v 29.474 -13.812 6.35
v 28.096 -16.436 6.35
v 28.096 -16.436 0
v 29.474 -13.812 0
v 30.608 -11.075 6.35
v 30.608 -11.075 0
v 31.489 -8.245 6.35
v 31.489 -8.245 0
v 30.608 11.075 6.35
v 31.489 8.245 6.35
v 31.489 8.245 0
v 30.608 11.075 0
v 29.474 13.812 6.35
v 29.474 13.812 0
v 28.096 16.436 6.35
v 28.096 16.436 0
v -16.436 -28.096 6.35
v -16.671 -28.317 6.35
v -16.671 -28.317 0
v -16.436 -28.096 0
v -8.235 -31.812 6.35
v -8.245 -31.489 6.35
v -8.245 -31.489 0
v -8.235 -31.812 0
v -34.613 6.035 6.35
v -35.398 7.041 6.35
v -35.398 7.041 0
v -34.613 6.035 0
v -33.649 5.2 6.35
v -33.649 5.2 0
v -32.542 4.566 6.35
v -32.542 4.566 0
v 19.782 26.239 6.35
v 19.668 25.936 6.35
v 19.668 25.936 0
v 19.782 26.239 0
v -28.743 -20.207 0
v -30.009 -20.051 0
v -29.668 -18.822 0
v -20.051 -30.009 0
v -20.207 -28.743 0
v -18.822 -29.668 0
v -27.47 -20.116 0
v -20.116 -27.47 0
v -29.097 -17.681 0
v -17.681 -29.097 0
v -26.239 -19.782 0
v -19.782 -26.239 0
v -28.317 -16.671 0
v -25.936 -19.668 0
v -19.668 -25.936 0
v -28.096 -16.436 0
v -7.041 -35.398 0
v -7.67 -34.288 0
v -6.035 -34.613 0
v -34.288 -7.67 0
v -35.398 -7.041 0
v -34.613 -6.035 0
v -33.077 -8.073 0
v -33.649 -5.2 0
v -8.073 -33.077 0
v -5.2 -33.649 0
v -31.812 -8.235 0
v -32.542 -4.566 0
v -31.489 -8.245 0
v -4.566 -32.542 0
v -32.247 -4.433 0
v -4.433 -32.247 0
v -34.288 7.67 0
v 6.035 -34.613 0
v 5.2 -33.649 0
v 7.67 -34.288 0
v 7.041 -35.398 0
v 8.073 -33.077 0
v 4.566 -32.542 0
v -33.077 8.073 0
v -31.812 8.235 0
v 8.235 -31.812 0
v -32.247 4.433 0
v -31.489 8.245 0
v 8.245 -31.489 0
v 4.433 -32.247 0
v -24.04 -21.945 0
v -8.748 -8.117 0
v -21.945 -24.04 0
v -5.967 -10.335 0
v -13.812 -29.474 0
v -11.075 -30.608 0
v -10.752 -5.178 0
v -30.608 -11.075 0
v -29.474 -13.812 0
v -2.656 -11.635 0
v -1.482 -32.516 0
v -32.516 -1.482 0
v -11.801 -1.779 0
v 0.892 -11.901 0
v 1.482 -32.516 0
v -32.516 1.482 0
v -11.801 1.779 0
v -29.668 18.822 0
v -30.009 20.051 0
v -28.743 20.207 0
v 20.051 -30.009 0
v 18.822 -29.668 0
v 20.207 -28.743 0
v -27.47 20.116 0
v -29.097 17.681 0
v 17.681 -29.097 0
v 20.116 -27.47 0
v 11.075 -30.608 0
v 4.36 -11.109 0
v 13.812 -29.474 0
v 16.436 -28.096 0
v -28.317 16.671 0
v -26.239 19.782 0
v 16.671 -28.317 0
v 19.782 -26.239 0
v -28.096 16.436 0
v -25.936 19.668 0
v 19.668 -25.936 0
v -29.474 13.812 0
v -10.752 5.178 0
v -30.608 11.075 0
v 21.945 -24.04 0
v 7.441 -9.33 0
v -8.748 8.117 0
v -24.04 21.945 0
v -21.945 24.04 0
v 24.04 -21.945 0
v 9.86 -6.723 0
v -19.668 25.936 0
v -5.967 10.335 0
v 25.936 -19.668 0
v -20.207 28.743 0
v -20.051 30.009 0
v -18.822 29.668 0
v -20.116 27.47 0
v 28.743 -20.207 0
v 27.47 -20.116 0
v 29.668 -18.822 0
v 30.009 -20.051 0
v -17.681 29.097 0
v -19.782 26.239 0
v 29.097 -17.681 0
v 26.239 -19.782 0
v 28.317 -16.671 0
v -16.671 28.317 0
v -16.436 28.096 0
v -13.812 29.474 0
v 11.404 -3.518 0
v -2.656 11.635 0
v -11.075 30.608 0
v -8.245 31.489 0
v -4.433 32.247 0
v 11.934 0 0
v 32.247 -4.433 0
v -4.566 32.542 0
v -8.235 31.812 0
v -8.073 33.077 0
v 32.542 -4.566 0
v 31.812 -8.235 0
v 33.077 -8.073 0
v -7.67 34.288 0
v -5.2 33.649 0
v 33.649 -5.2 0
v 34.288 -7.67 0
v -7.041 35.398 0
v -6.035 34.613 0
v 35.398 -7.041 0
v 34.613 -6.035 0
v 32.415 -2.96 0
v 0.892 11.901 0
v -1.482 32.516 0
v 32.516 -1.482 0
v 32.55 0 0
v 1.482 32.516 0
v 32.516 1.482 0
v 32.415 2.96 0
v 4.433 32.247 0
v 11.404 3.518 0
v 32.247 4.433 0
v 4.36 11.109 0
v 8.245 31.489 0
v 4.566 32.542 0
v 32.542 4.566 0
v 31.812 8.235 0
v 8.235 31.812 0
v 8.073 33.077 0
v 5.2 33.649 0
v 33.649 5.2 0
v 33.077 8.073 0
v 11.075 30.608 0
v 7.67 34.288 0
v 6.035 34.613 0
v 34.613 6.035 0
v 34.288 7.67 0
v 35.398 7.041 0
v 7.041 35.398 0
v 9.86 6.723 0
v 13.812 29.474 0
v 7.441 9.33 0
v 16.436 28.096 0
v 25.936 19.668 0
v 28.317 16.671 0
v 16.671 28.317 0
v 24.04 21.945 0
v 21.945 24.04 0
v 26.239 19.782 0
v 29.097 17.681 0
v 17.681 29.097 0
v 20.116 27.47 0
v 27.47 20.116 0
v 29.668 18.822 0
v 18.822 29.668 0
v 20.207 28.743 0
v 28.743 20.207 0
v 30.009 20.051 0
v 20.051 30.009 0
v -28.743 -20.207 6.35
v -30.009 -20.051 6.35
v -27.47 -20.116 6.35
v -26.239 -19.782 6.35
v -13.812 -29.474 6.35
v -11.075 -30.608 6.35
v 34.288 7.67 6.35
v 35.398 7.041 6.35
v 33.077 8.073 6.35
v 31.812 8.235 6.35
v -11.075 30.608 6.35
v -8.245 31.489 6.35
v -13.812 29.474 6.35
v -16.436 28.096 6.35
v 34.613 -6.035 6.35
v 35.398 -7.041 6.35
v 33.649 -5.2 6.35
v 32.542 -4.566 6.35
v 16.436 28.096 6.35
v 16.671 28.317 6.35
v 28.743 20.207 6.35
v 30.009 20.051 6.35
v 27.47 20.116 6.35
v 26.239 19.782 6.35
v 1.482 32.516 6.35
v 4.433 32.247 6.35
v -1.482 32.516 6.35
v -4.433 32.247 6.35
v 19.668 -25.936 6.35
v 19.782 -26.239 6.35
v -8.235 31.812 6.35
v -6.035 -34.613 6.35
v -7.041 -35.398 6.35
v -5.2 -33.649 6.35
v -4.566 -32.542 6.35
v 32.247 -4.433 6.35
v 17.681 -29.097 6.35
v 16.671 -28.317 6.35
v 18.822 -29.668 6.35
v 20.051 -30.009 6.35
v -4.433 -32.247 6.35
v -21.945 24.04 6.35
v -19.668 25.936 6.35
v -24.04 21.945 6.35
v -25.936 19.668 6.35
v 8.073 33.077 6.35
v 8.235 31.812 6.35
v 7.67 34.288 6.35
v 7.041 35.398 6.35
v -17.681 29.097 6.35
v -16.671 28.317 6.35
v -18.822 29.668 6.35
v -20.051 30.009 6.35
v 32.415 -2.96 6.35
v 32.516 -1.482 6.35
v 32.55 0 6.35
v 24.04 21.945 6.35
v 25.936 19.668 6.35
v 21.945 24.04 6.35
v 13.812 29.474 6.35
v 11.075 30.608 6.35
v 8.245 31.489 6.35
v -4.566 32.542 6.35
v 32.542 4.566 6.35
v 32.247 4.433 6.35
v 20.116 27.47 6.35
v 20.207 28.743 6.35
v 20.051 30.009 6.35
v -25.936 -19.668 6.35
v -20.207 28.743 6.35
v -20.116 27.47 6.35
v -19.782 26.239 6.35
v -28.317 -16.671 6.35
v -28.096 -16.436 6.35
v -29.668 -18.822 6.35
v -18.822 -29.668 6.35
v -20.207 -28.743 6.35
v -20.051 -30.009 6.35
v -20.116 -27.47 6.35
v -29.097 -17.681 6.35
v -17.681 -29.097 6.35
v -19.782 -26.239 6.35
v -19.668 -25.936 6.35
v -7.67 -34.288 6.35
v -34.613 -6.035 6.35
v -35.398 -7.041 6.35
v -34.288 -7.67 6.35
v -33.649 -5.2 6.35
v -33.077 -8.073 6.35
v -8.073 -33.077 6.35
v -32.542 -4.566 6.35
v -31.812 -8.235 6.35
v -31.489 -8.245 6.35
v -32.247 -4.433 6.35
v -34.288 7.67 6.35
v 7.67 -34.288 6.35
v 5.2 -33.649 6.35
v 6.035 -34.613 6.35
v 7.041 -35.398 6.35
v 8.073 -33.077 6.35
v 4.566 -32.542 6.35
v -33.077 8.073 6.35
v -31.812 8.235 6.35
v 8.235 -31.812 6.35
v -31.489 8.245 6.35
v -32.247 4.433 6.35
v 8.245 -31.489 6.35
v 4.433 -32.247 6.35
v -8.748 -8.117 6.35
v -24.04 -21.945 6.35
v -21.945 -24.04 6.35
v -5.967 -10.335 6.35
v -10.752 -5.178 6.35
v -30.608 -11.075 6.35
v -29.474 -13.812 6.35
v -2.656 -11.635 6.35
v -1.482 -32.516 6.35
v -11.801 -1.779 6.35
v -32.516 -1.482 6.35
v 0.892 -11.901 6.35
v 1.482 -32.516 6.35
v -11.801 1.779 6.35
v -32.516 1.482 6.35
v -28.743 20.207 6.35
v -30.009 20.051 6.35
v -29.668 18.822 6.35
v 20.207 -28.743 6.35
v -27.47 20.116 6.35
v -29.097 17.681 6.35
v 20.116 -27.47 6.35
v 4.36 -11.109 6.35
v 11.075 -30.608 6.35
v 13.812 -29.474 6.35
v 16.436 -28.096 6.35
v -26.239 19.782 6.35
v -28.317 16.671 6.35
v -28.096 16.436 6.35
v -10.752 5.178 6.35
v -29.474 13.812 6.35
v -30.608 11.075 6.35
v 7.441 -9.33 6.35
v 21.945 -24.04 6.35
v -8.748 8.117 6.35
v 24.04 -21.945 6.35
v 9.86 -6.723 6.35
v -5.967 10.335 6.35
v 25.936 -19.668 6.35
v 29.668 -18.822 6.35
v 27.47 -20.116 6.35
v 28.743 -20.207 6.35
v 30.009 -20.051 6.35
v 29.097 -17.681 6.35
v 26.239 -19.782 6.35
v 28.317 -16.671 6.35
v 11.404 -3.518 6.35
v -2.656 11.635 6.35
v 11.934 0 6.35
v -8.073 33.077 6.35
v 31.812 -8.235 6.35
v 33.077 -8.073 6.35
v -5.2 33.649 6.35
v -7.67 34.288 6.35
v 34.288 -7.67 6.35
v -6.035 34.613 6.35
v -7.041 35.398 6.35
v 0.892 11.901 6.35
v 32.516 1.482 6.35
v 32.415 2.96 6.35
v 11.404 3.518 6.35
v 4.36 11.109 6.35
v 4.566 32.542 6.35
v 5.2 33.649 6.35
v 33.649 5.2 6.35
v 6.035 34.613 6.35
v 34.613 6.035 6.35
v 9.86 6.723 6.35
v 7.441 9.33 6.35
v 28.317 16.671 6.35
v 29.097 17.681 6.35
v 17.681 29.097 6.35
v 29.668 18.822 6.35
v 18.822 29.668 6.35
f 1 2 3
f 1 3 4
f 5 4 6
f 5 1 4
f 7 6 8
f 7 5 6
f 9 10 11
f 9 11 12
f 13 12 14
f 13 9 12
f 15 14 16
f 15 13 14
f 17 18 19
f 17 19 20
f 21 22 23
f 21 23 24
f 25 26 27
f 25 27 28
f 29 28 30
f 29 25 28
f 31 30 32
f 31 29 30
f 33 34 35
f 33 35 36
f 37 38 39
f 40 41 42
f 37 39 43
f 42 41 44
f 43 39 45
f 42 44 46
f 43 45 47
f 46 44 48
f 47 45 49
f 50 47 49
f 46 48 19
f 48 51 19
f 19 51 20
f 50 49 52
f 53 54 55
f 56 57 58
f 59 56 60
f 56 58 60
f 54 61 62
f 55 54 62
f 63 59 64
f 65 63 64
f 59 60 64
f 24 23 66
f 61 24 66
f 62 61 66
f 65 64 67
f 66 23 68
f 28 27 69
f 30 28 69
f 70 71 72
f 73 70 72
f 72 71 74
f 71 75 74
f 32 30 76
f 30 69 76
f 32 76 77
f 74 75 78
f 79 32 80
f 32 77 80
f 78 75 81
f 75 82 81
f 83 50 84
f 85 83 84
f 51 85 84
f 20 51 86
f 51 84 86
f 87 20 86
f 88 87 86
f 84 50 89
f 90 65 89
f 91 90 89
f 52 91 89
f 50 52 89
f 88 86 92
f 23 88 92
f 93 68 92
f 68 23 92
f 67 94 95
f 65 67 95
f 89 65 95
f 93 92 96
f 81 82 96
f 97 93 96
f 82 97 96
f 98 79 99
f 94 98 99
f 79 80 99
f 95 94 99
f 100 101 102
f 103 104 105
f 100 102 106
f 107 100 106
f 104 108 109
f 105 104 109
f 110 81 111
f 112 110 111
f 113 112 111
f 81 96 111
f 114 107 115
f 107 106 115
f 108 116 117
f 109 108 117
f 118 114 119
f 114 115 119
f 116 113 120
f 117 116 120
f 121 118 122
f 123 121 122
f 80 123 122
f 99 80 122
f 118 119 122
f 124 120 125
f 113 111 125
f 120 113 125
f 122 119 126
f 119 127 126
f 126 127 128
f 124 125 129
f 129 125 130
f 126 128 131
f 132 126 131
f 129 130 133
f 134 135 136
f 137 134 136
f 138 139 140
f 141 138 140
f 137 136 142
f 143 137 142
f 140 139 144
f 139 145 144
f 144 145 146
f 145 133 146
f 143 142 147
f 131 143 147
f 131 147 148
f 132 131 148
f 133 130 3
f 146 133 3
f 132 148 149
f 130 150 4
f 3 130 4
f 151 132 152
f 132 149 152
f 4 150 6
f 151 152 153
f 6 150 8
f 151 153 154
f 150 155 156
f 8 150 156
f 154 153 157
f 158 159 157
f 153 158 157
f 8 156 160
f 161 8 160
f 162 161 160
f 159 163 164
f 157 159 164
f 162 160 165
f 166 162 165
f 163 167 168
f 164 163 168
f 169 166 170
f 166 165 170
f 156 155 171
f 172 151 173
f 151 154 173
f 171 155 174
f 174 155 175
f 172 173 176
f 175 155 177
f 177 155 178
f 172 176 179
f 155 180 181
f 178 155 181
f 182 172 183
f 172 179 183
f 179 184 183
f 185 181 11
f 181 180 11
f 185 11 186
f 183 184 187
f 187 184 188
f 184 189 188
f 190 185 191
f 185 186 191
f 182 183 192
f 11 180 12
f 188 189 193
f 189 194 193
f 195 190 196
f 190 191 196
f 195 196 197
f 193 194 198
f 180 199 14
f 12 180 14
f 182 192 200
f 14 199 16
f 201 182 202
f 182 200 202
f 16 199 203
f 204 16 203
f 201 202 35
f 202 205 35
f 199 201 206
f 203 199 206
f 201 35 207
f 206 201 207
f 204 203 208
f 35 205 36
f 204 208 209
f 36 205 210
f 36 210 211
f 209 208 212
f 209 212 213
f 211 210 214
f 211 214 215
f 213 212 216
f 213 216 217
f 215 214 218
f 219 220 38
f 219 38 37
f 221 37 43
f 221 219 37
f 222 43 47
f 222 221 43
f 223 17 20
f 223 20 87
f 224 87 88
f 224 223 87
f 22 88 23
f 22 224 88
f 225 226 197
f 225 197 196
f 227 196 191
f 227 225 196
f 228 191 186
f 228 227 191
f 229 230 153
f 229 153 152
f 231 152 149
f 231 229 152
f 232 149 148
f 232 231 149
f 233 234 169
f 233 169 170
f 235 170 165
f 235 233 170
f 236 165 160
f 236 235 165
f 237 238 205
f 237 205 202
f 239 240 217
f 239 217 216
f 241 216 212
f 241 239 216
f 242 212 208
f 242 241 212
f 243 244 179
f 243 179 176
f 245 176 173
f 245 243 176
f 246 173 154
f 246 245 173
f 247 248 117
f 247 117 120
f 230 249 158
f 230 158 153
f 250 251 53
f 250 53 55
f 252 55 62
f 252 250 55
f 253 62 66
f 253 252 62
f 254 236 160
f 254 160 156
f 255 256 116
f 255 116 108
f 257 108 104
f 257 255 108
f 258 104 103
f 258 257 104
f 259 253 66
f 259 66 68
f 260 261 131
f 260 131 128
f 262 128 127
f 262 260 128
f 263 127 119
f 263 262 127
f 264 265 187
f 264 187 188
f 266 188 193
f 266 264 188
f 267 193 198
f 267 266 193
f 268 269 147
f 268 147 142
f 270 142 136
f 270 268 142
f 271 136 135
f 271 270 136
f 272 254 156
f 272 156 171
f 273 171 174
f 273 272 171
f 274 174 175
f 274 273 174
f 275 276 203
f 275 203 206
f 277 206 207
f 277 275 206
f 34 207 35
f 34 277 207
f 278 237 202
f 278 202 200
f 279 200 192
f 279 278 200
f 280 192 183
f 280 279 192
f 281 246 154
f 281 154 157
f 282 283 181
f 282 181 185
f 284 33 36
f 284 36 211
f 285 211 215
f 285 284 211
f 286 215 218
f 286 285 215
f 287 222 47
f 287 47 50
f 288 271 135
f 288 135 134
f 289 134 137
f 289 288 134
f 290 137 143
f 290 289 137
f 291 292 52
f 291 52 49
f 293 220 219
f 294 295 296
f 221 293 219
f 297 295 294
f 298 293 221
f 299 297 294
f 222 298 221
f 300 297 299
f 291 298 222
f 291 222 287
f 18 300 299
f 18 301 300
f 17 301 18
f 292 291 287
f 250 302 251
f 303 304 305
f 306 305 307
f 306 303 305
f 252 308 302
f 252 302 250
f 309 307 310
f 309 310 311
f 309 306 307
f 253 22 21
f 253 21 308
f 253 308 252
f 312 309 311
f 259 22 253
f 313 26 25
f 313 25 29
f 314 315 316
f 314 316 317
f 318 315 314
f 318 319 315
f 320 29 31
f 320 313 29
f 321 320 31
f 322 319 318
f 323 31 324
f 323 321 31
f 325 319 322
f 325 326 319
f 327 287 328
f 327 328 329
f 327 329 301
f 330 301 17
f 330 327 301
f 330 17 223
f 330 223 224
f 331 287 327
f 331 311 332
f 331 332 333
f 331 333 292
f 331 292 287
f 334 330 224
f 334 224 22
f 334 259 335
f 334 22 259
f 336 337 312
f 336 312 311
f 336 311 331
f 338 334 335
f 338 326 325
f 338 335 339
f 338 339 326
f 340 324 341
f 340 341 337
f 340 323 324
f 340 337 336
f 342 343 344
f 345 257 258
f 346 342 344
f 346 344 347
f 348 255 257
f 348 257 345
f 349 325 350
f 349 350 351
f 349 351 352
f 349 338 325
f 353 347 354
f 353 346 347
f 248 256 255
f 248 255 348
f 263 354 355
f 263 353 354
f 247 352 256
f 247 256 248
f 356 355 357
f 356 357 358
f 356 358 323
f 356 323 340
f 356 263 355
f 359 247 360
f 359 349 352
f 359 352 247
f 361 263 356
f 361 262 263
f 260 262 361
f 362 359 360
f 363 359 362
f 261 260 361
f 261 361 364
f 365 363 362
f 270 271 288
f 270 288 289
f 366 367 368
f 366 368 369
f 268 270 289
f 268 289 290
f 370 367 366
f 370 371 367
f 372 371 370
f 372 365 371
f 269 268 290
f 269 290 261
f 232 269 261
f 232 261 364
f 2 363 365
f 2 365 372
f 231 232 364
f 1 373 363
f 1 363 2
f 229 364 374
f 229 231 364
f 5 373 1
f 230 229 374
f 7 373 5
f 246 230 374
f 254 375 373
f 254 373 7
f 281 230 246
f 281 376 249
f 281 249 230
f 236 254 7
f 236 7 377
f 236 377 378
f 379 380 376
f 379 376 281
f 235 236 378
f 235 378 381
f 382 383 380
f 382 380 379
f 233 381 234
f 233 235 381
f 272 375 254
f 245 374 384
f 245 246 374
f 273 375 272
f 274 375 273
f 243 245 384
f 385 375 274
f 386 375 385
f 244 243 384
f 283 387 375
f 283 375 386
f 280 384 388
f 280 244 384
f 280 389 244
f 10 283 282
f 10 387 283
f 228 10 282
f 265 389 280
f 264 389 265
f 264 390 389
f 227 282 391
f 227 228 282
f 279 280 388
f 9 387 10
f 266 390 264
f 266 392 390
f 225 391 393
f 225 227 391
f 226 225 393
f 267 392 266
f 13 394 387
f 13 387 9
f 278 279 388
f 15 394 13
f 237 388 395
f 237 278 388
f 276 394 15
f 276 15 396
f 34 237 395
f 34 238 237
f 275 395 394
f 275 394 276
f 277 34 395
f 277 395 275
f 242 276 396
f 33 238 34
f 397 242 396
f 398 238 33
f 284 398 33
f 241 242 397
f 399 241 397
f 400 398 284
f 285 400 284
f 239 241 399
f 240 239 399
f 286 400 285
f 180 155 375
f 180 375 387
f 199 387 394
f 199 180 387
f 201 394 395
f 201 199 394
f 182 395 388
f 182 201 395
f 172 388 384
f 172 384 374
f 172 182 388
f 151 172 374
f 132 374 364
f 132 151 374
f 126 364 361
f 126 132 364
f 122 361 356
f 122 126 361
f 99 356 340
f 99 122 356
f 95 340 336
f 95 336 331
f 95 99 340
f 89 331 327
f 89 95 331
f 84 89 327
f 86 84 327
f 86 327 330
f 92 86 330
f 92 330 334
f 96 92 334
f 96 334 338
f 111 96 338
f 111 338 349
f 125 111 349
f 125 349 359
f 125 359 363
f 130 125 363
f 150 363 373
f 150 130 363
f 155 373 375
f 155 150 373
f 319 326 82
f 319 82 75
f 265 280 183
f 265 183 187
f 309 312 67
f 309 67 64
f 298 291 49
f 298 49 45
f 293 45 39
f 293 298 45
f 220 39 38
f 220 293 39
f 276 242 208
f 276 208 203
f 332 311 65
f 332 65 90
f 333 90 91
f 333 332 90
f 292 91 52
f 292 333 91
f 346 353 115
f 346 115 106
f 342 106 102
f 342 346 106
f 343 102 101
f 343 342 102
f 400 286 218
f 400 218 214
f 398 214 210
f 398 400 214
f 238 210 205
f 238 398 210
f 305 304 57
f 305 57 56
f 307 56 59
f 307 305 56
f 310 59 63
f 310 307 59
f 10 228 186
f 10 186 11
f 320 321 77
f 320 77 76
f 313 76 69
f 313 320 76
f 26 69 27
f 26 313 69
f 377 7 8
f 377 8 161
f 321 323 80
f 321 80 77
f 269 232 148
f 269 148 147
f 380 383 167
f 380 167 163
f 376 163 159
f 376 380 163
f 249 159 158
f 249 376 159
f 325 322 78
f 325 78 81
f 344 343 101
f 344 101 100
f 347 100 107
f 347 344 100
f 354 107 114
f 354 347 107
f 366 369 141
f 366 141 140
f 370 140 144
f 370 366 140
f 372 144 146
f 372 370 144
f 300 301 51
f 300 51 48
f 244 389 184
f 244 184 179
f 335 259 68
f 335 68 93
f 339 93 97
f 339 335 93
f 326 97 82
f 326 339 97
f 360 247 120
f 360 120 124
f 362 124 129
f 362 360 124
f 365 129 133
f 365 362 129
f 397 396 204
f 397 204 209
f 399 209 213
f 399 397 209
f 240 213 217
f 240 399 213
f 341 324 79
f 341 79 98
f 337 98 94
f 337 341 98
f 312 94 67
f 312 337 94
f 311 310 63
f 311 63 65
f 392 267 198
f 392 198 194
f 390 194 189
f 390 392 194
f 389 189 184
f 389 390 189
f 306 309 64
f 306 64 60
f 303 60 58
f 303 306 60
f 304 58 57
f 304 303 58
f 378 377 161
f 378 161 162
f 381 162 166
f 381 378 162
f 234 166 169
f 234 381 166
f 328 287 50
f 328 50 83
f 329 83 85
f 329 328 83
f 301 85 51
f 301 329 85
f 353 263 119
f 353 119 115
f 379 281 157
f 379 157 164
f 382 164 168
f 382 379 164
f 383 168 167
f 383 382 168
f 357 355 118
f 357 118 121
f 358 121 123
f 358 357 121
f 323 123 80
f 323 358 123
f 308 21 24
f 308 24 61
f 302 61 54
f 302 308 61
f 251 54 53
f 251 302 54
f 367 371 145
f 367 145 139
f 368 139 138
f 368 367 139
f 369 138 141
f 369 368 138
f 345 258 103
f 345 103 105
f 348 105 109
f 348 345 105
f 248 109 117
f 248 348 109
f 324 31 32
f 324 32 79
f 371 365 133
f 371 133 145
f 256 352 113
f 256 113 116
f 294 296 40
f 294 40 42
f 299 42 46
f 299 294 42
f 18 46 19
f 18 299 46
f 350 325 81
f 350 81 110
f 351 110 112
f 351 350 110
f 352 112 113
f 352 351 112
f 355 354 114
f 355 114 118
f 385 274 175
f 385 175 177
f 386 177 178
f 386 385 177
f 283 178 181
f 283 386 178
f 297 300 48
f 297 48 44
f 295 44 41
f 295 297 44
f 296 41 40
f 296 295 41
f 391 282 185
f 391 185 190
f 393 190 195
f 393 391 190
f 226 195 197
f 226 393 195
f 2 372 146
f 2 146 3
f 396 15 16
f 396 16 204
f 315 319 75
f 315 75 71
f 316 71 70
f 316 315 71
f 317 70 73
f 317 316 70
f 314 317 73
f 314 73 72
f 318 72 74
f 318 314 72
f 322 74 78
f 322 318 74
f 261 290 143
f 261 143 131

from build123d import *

# Parameters (mm, degrees)
F0_R     = 44.45
F0_R_2   = 25.4
F0_R_3   = 11.9340457022
F1_DEPTH = 6.35
F3_DEPTH = 6.35


with BuildPart() as f1:
    # F0 (on Top) → F1 (new body)
    with BuildSketch(Plane.XY):
        Circle(F0_R)
        Circle(F0_R_2, mode=Mode.SUBTRACT)
        Circle(F0_R_2)
        Circle(F0_R_3, mode=Mode.SUBTRACT)
    extrude(amount=F1_DEPTH)

    # F2 (on face) → F3 (intersect)
    with BuildSketch(Plane.XY.offset(6.35)):
        with BuildLine():
            ThreePointArc((32.2468627383, -4.4327027358), (32.4742021983, -2.2215313627), (32.5501, 0))
            ThreePointArc((32.5501, 0), (32.4742021983, 2.2215313627), (32.2468627383, 4.4327027358))
            ThreePointArc((32.2468627383, 4.4327027358), (31.1168279297, 3.8288728943), (30.0699408338, 3.0902142758))
            ThreePointArc((30.0699408338, 3.0902142758), (28.5877, 0), (30.0699408338, -3.0902142758))
            ThreePointArc((30.0699408338, -3.0902142758), (31.1168279297, -3.8288728943), (32.2468627383, -4.4327027358))
        make_face()
        with BuildLine():
            ThreePointArc((30.0699408338, 3.0902142758), (31.1168279297, 3.8288728943), (32.2468627383, 4.4327027358))
            ThreePointArc((32.2468627383, 4.4327027358), (31.9246589557, 6.3502094907), (31.4885383693, 8.2450567844))
            ThreePointArc((31.4885383693, 8.2450567844), (30.2134466622, 8.3704772169), (28.963576686, 8.6522824488))
            ThreePointArc((28.963576686, 8.6522824488), (26.4115909116, 10.9400391594), (26.5984290744, 14.3622538898))
            ThreePointArc((26.5984290744, 14.3622538898), (27.2829542197, 15.4453118161), (28.0958945741, 16.4356234471))
            ThreePointArc((28.0958945741, 16.4356234471), (27.0644190274, 18.0838666418), (25.9363694778, 19.6675811508))
            ThreePointArc((25.9363694778, 19.6675811508), (24.710342026, 19.2954980503), (23.4477705432, 19.0775476037))
            ThreePointArc((23.4477705432, 19.0775476037), (20.2145565285, 20.2145565285), (19.0775476037, 23.4477705432))
            ThreePointArc((19.0775476037, 23.4477705432), (19.2954980503, 24.710342026), (19.6675811508, 25.9363694778))
            ThreePointArc((19.6675811508, 25.9363694778), (18.0838666418, 27.0644190274), (16.4356234471, 28.0958945741))
            ThreePointArc((16.4356234471, 28.0958945741), (15.4453118161, 27.2829542197), (14.3622538898, 26.5984290744))
            ThreePointArc((14.3622538898, 26.5984290744), (10.9400391594, 26.4115909116), (8.6522824488, 28.963576686))
            ThreePointArc((8.6522824488, 28.963576686), (8.3704772169, 30.2134466622), (8.2450567844, 31.4885383693))
            ThreePointArc((8.2450567844, 31.4885383693), (6.3502094907, 31.9246589557), (4.4327027358, 32.2468627383))
            ThreePointArc((4.4327027358, 32.2468627383), (3.8288728943, 31.1168279297), (3.0902142758, 30.0699408338))
            ThreePointArc((3.0902142758, 30.0699408338), (0, 28.5877), (-3.0902142758, 30.0699408338))
            ThreePointArc((-3.0902142758, 30.0699408338), (-3.8288728943, 31.1168279297), (-4.4327027358, 32.2468627383))
            ThreePointArc((-4.4327027358, 32.2468627383), (-6.3502094907, 31.9246589557), (-8.2450567844, 31.4885383693))
            ThreePointArc((-8.2450567844, 31.4885383693), (-8.3704772169, 30.2134466622), (-8.6522824488, 28.963576686))
            ThreePointArc((-8.6522824488, 28.963576686), (-10.9400391594, 26.4115909116), (-14.3622538898, 26.5984290744))
            ThreePointArc((-14.3622538898, 26.5984290744), (-15.4453118161, 27.2829542197), (-16.4356234471, 28.0958945741))
            ThreePointArc((-16.4356234471, 28.0958945741), (-18.0838666418, 27.0644190274), (-19.6675811508, 25.9363694778))
            ThreePointArc((-19.6675811508, 25.9363694778), (-19.2954980503, 24.710342026), (-19.0775476037, 23.4477705432))
            ThreePointArc((-19.0775476037, 23.4477705432), (-20.2145565285, 20.2145565285), (-23.4477705432, 19.0775476037))
            ThreePointArc((-23.4477705432, 19.0775476037), (-24.710342026, 19.2954980503), (-25.9363694778, 19.6675811508))
            ThreePointArc((-25.9363694778, 19.6675811508), (-27.0644190274, 18.0838666418), (-28.0958945741, 16.4356234471))
            ThreePointArc((-28.0958945741, 16.4356234471), (-27.2829542197, 15.4453118161), (-26.5984290744, 14.3622538898))
            ThreePointArc((-26.5984290744, 14.3622538898), (-26.4115909116, 10.9400391594), (-28.963576686, 8.6522824488))
            ThreePointArc((-28.963576686, 8.6522824488), (-30.2134466622, 8.3704772169), (-31.4885383693, 8.2450567844))
            ThreePointArc((-31.4885383693, 8.2450567844), (-31.9246589557, 6.3502094907), (-32.2468627383, 4.4327027358))
            ThreePointArc((-32.2468627383, 4.4327027358), (-31.1168279297, 3.8288728943), (-30.0699408338, 3.0902142758))
            ThreePointArc((-30.0699408338, 3.0902142758), (-28.5877, 0), (-30.0699408338, -3.0902142758))
            ThreePointArc((-30.0699408338, -3.0902142758), (-31.1168279297, -3.8288728943), (-32.2468627383, -4.4327027358))
            ThreePointArc((-32.2468627383, -4.4327027358), (-31.9246589557, -6.3502094907), (-31.4885383693, -8.2450567844))
            ThreePointArc((-31.4885383693, -8.2450567844), (-30.2134466622, -8.3704772169), (-28.963576686, -8.6522824488))
            ThreePointArc((-28.963576686, -8.6522824488), (-26.4115909116, -10.9400391594), (-26.5984290744, -14.3622538898))
            ThreePointArc((-26.5984290744, -14.3622538898), (-27.2829542197, -15.4453118161), (-28.0958945741, -16.4356234471))
            ThreePointArc((-28.0958945741, -16.4356234471), (-27.0644190274, -18.0838666418), (-25.9363694778, -19.6675811508))
            ThreePointArc((-25.9363694778, -19.6675811508), (-24.710342026, -19.2954980503), (-23.4477705432, -19.0775476037))
            ThreePointArc((-23.4477705432, -19.0775476037), (-20.2145565285, -20.2145565285), (-19.0775476037, -23.4477705432))
            ThreePointArc((-19.0775476037, -23.4477705432), (-19.2954980503, -24.710342026), (-19.6675811508, -25.9363694778))
            ThreePointArc((-19.6675811508, -25.9363694778), (-18.0838666418, -27.0644190274), (-16.4356234471, -28.0958945741))
            ThreePointArc((-16.4356234471, -28.0958945741), (-15.4453118161, -27.2829542197), (-14.3622538898, -26.5984290744))
            ThreePointArc((-14.3622538898, -26.5984290744), (-10.9400391594, -26.4115909116), (-8.6522824488, -28.963576686))
            ThreePointArc((-8.6522824488, -28.963576686), (-8.3704772169, -30.2134466622), (-8.2450567844, -31.4885383693))
            ThreePointArc((-8.2450567844, -31.4885383693), (-6.3502094907, -31.9246589557), (-4.4327027358, -32.2468627383))
            ThreePointArc((-4.4327027358, -32.2468627383), (-3.8288728943, -31.1168279297), (-3.0902142758, -30.0699408338))
            ThreePointArc((-3.0902142758, -30.0699408338), (0, -28.5877), (3.0902142758, -30.0699408338))
            ThreePointArc((3.0902142758, -30.0699408338), (3.8288728943, -31.1168279297), (4.4327027358, -32.2468627383))
            ThreePointArc((4.4327027358, -32.2468627383), (6.3502094907, -31.9246589557), (8.2450567844, -31.4885383693))
            ThreePointArc((8.2450567844, -31.4885383693), (8.3704772169, -30.2134466622), (8.6522824488, -28.963576686))
            ThreePointArc((8.6522824488, -28.963576686), (10.9400391594, -26.4115909116), (14.3622538898, -26.5984290744))
            ThreePointArc((14.3622538898, -26.5984290744), (15.4453118161, -27.2829542197), (16.4356234471, -28.0958945741))
            ThreePointArc((16.4356234471, -28.0958945741), (18.0838666418, -27.0644190274), (19.6675811508, -25.9363694778))
            ThreePointArc((19.6675811508, -25.9363694778), (19.2954980503, -24.710342026), (19.0775476037, -23.4477705432))
            ThreePointArc((19.0775476037, -23.4477705432), (20.2145565285, -20.2145565285), (23.4477705432, -19.0775476037))
            ThreePointArc((23.4477705432, -19.0775476037), (24.710342026, -19.2954980503), (25.9363694778, -19.6675811508))
            ThreePointArc((25.9363694778, -19.6675811508), (27.0644190274, -18.0838666418), (28.0958945741, -16.4356234471))
            ThreePointArc((28.0958945741, -16.4356234471), (27.2829542197, -15.4453118161), (26.5984290744, -14.3622538898))
            ThreePointArc((26.5984290744, -14.3622538898), (26.4115909116, -10.9400391594), (28.963576686, -8.6522824488))
            ThreePointArc((28.963576686, -8.6522824488), (30.2134466622, -8.3704772169), (31.4885383693, -8.2450567844))
            ThreePointArc((31.4885383693, -8.2450567844), (31.9246589557, -6.3502094907), (32.2468627383, -4.4327027358))
            ThreePointArc((32.2468627383, -4.4327027358), (31.1168279297, -3.8288728943), (30.0699408338, -3.0902142758))
            ThreePointArc((30.0699408338, -3.0902142758), (28.5877, 0), (30.0699408338, 3.0902142758))
        make_face()
        with BuildLine():
            ThreePointArc((31.4885383693, 8.2450567844), (31.9246589557, 6.3502094907), (32.2468627383, 4.4327027358))
            Line((32.2468627383, 4.4327027358), (32.5415226488, 4.5656185547))
            ThreePointArc((32.5415226488, 4.5656185547), (34.1510381023, 5.5942061718), (35.3980380551, 7.0411075501))
            ThreePointArc((35.3980380551, 7.0411075501), (33.6922551359, 7.900663897), (31.8116333114, 8.2350200457))
            Line((31.8116333114, 8.2350200457), (31.4885383693, 8.2450567844))
        make_face()
        with BuildLine():
            Line((32.5415226488, -4.5656185547), (32.2468627383, -4.4327027358))
            ThreePointArc((32.2468627383, -4.4327027358), (31.9246589557, -6.3502094907), (31.4885383693, -8.2450567844))
            Line((31.4885383693, -8.2450567844), (31.8116333114, -8.2350200457))
            ThreePointArc((31.8116333114, -8.2350200457), (33.6922551359, -7.900663897), (35.3980380551, -7.0411075501))
            ThreePointArc((35.3980380551, -7.0411075501), (34.1510381023, -5.5942061718), (32.5415226488, -4.5656185547))
        make_face()
        with BuildLine():
            ThreePointArc((28.963576686, 8.6522824488), (30.2134466622, 8.3704772169), (31.4885383693, 8.2450567844))
            ThreePointArc((31.4885383693, 8.2450567844), (30.0723711712, 12.4563839918), (28.0958945741, 16.4356234471))
            ThreePointArc((28.0958945741, 16.4356234471), (27.2829542197, 15.4453118161), (26.5984290744, 14.3622538898))
            ThreePointArc((26.5984290744, 14.3622538898), (26.4115909116, 10.9400391594), (28.963576686, 8.6522824488))
        make_face()
        with BuildLine():
            ThreePointArc((28.0958945741, -16.4356234471), (30.0723711712, -12.4563839918), (31.4885383693, -8.2450567844))
            ThreePointArc((31.4885383693, -8.2450567844), (30.2134466622, -8.3704772169), (28.963576686, -8.6522824488))
            ThreePointArc((28.963576686, -8.6522824488), (26.4115909116, -10.9400391594), (26.5984290744, -14.3622538898))
            ThreePointArc((26.5984290744, -14.3622538898), (27.2829542197, -15.4453118161), (28.0958945741, -16.4356234471))
        make_face()
        with BuildLine():
            ThreePointArc((25.9363694778, 19.6675811508), (27.0644190274, 18.0838666418), (28.0958945741, 16.4356234471))
            Line((28.0958945741, 16.4356234471), (28.3172601526, 16.6711831176))
            ThreePointArc((28.3172601526, 16.6711831176), (29.4106350975, 18.2374090626), (30.0090076452, 20.0513778537))
            ThreePointArc((30.0090076452, 20.0513778537), (28.1041317461, 20.1927295073), (26.2387111755, 19.7819514948))
            Line((26.2387111755, 19.7819514948), (25.9363694778, 19.6675811508))
        make_face()
        with BuildLine():
            Line((28.3172601526, -16.6711831176), (28.0958945741, -16.4356234471))
            ThreePointArc((28.0958945741, -16.4356234471), (27.0644190274, -18.0838666418), (25.9363694778, -19.6675811508))
            Line((25.9363694778, -19.6675811508), (26.2387111755, -19.7819514948))
            ThreePointArc((26.2387111755, -19.7819514948), (28.1041317461, -20.1927295073), (30.0090076452, -20.0513778537))
            ThreePointArc((30.0090076452, -20.0513778537), (29.4106350975, -18.2374090626), (28.3172601526, -16.6711831176))
        make_face()
        with BuildLine():
            ThreePointArc((23.4477705432, 19.0775476037), (24.710342026, 19.2954980503), (25.9363694778, 19.6675811508))
            ThreePointArc((25.9363694778, 19.6675811508), (23.0163964383, 23.0163964383), (19.6675811508, 25.9363694778))
            ThreePointArc((19.6675811508, 25.9363694778), (19.2954980503, 24.710342026), (19.0775476037, 23.4477705432))
            ThreePointArc((19.0775476037, 23.4477705432), (20.2145565285, 20.2145565285), (23.4477705432, 19.0775476037))
        make_face()
        with BuildLine():
            ThreePointArc((19.6675811508, -25.9363694778), (23.0163964383, -23.0163964383), (25.9363694778, -19.6675811508))
            ThreePointArc((25.9363694778, -19.6675811508), (24.710342026, -19.2954980503), (23.4477705432, -19.0775476037))
            ThreePointArc((23.4477705432, -19.0775476037), (20.2145565285, -20.2145565285), (19.0775476037, -23.4477705432))
            ThreePointArc((19.0775476037, -23.4477705432), (19.2954980503, -24.710342026), (19.6675811508, -25.9363694778))
        make_face()
        with BuildLine():
            ThreePointArc((16.4356234471, 28.0958945741), (18.0838666418, 27.0644190274), (19.6675811508, 25.9363694778))
            Line((19.6675811508, 25.9363694778), (19.7819514948, 26.2387111755))
            ThreePointArc((19.7819514948, 26.2387111755), (20.1927295073, 28.1041317461), (20.0513778537, 30.0090076452))
            ThreePointArc((20.0513778537, 30.0090076452), (18.2374090626, 29.4106350975), (16.6711831176, 28.3172601526))
            Line((16.6711831176, 28.3172601526), (16.4356234471, 28.0958945741))
        make_face()
        with BuildLine():
            Line((19.7819514948, -26.2387111755), (19.6675811508, -25.9363694778))
            ThreePointArc((19.6675811508, -25.9363694778), (18.0838666418, -27.0644190274), (16.4356234471, -28.0958945741))
            Line((16.4356234471, -28.0958945741), (16.6711831176, -28.3172601526))
            ThreePointArc((16.6711831176, -28.3172601526), (18.2374090626, -29.4106350975), (20.0513778537, -30.0090076452))
            ThreePointArc((20.0513778537, -30.0090076452), (20.1927295073, -28.1041317461), (19.7819514948, -26.2387111755))
        make_face()
        with BuildLine():
            ThreePointArc((14.3622538898, 26.5984290744), (15.4453118161, 27.2829542197), (16.4356234471, 28.0958945741))
            ThreePointArc((16.4356234471, 28.0958945741), (12.4563839918, 30.0723711712), (8.2450567844, 31.4885383693))
            ThreePointArc((8.2450567844, 31.4885383693), (8.3704772169, 30.2134466622), (8.6522824488, 28.963576686))
            ThreePointArc((8.6522824488, 28.963576686), (10.9400391594, 26.4115909116), (14.3622538898, 26.5984290744))
        make_face()
        with BuildLine():
            ThreePointArc((8.2450567844, -31.4885383693), (12.4563839918, -30.0723711712), (16.4356234471, -28.0958945741))
            ThreePointArc((16.4356234471, -28.0958945741), (15.4453118161, -27.2829542197), (14.3622538898, -26.5984290744))
            ThreePointArc((14.3622538898, -26.5984290744), (10.9400391594, -26.4115909116), (8.6522824488, -28.963576686))
            ThreePointArc((8.6522824488, -28.963576686), (8.3704772169, -30.2134466622), (8.2450567844, -31.4885383693))
        make_face()
        with BuildLine():
            ThreePointArc((4.4327027358, 32.2468627383), (6.3502094907, 31.9246589557), (8.2450567844, 31.4885383693))
            Line((8.2450567844, 31.4885383693), (8.2350200457, 31.8116333114))
            ThreePointArc((8.2350200457, 31.8116333114), (7.900663897, 33.6922551359), (7.0411075501, 35.3980380551))
            ThreePointArc((7.0411075501, 35.3980380551), (5.5942061718, 34.1510381023), (4.5656185547, 32.5415226488))
            Line((4.5656185547, 32.5415226488), (4.4327027358, 32.2468627383))
        make_face()
        with BuildLine():
            Line((8.2350200457, -31.8116333114), (8.2450567844, -31.4885383693))
            ThreePointArc((8.2450567844, -31.4885383693), (6.3502094907, -31.9246589557), (4.4327027358, -32.2468627383))
            Line((4.4327027358, -32.2468627383), (4.5656185547, -32.5415226488))
            ThreePointArc((4.5656185547, -32.5415226488), (5.5942061718, -34.1510381023), (7.0411075501, -35.3980380551))
            ThreePointArc((7.0411075501, -35.3980380551), (7.900663897, -33.6922551359), (8.2350200457, -31.8116333114))
        make_face()
        with BuildLine():
            ThreePointArc((3.0902142758, 30.0699408338), (3.8288728943, 31.1168279297), (4.4327027358, 32.2468627383))
            ThreePointArc((4.4327027358, 32.2468627383), (0, 32.5501), (-4.4327027358, 32.2468627383))
            ThreePointArc((-4.4327027358, 32.2468627383), (-3.8288728943, 31.1168279297), (-3.0902142758, 30.0699408338))
            ThreePointArc((-3.0902142758, 30.0699408338), (0, 28.5877), (3.0902142758, 30.0699408338))
        make_face()
        with BuildLine():
            ThreePointArc((-4.4327027358, -32.2468627383), (0, -32.5501), (4.4327027358, -32.2468627383))
            ThreePointArc((4.4327027358, -32.2468627383), (3.8288728943, -31.1168279297), (3.0902142758, -30.0699408338))
            ThreePointArc((3.0902142758, -30.0699408338), (0, -28.5877), (-3.0902142758, -30.0699408338))
            ThreePointArc((-3.0902142758, -30.0699408338), (-3.8288728943, -31.1168279297), (-4.4327027358, -32.2468627383))
        make_face()
        with BuildLine():
            ThreePointArc((-8.2450567844, 31.4885383693), (-6.3502094907, 31.9246589557), (-4.4327027358, 32.2468627383))
            Line((-4.4327027358, 32.2468627383), (-4.4568878106, 32.3001493474))
            Line((-4.4568878106, 32.3001493474), (-4.5656185547, 32.5415226488))
            ThreePointArc((-4.5656185547, 32.5415226488), (-5.5942061718, 34.1510381023), (-7.0411075501, 35.3980380551))
            ThreePointArc((-7.0411075501, 35.3980380551), (-7.900663897, 33.6922551359), (-8.2350200457, 31.8116333114))
            Line((-8.2350200457, 31.8116333114), (-8.2450567844, 31.4885383693))
        make_face()
        Polygon((-4.4568878106, 32.3001493474), (-4.4327027358, 32.2468627383), (-4.5656185547, 32.5415226488), align=None)
        with BuildLine():
            Line((-4.5656185547, -32.5415226488), (-4.4327027358, -32.2468627383))
            ThreePointArc((-4.4327027358, -32.2468627383), (-6.3502094907, -31.9246589557), (-8.2450567844, -31.4885383693))
            Line((-8.2450567844, -31.4885383693), (-8.2350200457, -31.8116333114))
            ThreePointArc((-8.2350200457, -31.8116333114), (-7.900663897, -33.6922551359), (-7.0411075501, -35.3980380551))
            ThreePointArc((-7.0411075501, -35.3980380551), (-5.5942061718, -34.1510381023), (-4.5656185547, -32.5415226488))
        make_face()
        with BuildLine():
            ThreePointArc((-8.6522824488, 28.963576686), (-8.3704772169, 30.2134466622), (-8.2450567844, 31.4885383693))
            ThreePointArc((-8.2450567844, 31.4885383693), (-12.4563839918, 30.0723711712), (-16.4356234471, 28.0958945741))
            ThreePointArc((-16.4356234471, 28.0958945741), (-15.4453118161, 27.2829542197), (-14.3622538898, 26.5984290744))
            ThreePointArc((-14.3622538898, 26.5984290744), (-10.9400391594, 26.4115909116), (-8.6522824488, 28.963576686))
        make_face()
        with BuildLine():
            ThreePointArc((-16.4356234471, -28.0958945741), (-12.4563839918, -30.0723711712), (-8.2450567844, -31.4885383693))
            ThreePointArc((-8.2450567844, -31.4885383693), (-8.3704772169, -30.2134466622), (-8.6522824488, -28.963576686))
            ThreePointArc((-8.6522824488, -28.963576686), (-10.9400391594, -26.4115909116), (-14.3622538898, -26.5984290744))
            ThreePointArc((-14.3622538898, -26.5984290744), (-15.4453118161, -27.2829542197), (-16.4356234471, -28.0958945741))
        make_face()
        with BuildLine():
            ThreePointArc((-19.6675811508, 25.9363694778), (-18.0838666418, 27.0644190274), (-16.4356234471, 28.0958945741))
            Line((-16.4356234471, 28.0958945741), (-16.6711831176, 28.3172601526))
            ThreePointArc((-16.6711831176, 28.3172601526), (-18.2374090626, 29.4106350975), (-20.0513778537, 30.0090076452))
            ThreePointArc((-20.0513778537, 30.0090076452), (-20.1927295073, 28.1041317461), (-19.7819514948, 26.2387111755))
            Line((-19.7819514948, 26.2387111755), (-19.6675811508, 25.9363694778))
        make_face()
        with BuildLine():
            Line((-16.6711831176, -28.3172601526), (-16.4356234471, -28.0958945741))
            ThreePointArc((-16.4356234471, -28.0958945741), (-18.0838666418, -27.0644190274), (-19.6675811508, -25.9363694778))
            Line((-19.6675811508, -25.9363694778), (-19.7819514948, -26.2387111755))
            ThreePointArc((-19.7819514948, -26.2387111755), (-20.1927295073, -28.1041317461), (-20.0513778537, -30.0090076452))
            ThreePointArc((-20.0513778537, -30.0090076452), (-18.2374090626, -29.4106350975), (-16.6711831176, -28.3172601526))
        make_face()
        with BuildLine():
            ThreePointArc((-19.0775476037, 23.4477705432), (-19.2954980503, 24.710342026), (-19.6675811508, 25.9363694778))
            ThreePointArc((-19.6675811508, 25.9363694778), (-23.0163964383, 23.0163964383), (-25.9363694778, 19.6675811508))
            ThreePointArc((-25.9363694778, 19.6675811508), (-24.710342026, 19.2954980503), (-23.4477705432, 19.0775476037))
            ThreePointArc((-23.4477705432, 19.0775476037), (-20.2145565285, 20.2145565285), (-19.0775476037, 23.4477705432))
        make_face()
        with BuildLine():
            ThreePointArc((-25.9363694778, -19.6675811508), (-23.0163964383, -23.0163964383), (-19.6675811508, -25.9363694778))
            ThreePointArc((-19.6675811508, -25.9363694778), (-19.2954980503, -24.710342026), (-19.0775476037, -23.4477705432))
            ThreePointArc((-19.0775476037, -23.4477705432), (-20.2145565285, -20.2145565285), (-23.4477705432, -19.0775476037))
            ThreePointArc((-23.4477705432, -19.0775476037), (-24.710342026, -19.2954980503), (-25.9363694778, -19.6675811508))
        make_face()
        with BuildLine():
            ThreePointArc((-28.0958945741, 16.4356234471), (-27.0644190274, 18.0838666418), (-25.9363694778, 19.6675811508))
            Line((-25.9363694778, 19.6675811508), (-26.2387111755, 19.7819514948))
            ThreePointArc((-26.2387111755, 19.7819514948), (-28.1041317461, 20.1927295073), (-30.0090076452, 20.0513778537))
            ThreePointArc((-30.0090076452, 20.0513778537), (-29.4106350975, 18.2374090626), (-28.3172601526, 16.6711831176))
            Line((-28.3172601526, 16.6711831176), (-28.0958945741, 16.4356234471))
        make_face()
        with BuildLine():
            Line((-26.2387111755, -19.7819514948), (-25.9363694778, -19.6675811508))
            ThreePointArc((-25.9363694778, -19.6675811508), (-27.0644190274, -18.0838666418), (-28.0958945741, -16.4356234471))
            Line((-28.0958945741, -16.4356234471), (-28.3172601526, -16.6711831176))
            ThreePointArc((-28.3172601526, -16.6711831176), (-29.4106350975, -18.2374090626), (-30.0090076452, -20.0513778537))
            ThreePointArc((-30.0090076452, -20.0513778537), (-28.1041317461, -20.1927295073), (-26.2387111755, -19.7819514948))
        make_face()
        with BuildLine():
            ThreePointArc((-26.5984290744, 14.3622538898), (-27.2829542197, 15.4453118161), (-28.0958945741, 16.4356234471))
            ThreePointArc((-28.0958945741, 16.4356234471), (-30.0723711712, 12.4563839918), (-31.4885383693, 8.2450567844))
            ThreePointArc((-31.4885383693, 8.2450567844), (-30.2134466622, 8.3704772169), (-28.963576686, 8.6522824488))
            ThreePointArc((-28.963576686, 8.6522824488), (-26.4115909116, 10.9400391594), (-26.5984290744, 14.3622538898))
        make_face()
        with BuildLine():
            ThreePointArc((-31.4885383693, -8.2450567844), (-30.0723711712, -12.4563839918), (-28.0958945741, -16.4356234471))
            ThreePointArc((-28.0958945741, -16.4356234471), (-27.2829542197, -15.4453118161), (-26.5984290744, -14.3622538898))
            ThreePointArc((-26.5984290744, -14.3622538898), (-26.4115909116, -10.9400391594), (-28.963576686, -8.6522824488))
            ThreePointArc((-28.963576686, -8.6522824488), (-30.2134466622, -8.3704772169), (-31.4885383693, -8.2450567844))
        make_face()
        with BuildLine():
            ThreePointArc((-32.2468627383, 4.4327027358), (-31.9246589557, 6.3502094907), (-31.4885383693, 8.2450567844))
            Line((-31.4885383693, 8.2450567844), (-31.8116333114, 8.2350200457))
            ThreePointArc((-31.8116333114, 8.2350200457), (-33.6922551359, 7.900663897), (-35.3980380551, 7.0411075501))
            ThreePointArc((-35.3980380551, 7.0411075501), (-34.1510381023, 5.5942061718), (-32.5415226488, 4.5656185547))
            Line((-32.5415226488, 4.5656185547), (-32.2468627383, 4.4327027358))
        make_face()
        with BuildLine():
            Line((-31.8116333114, -8.2350200457), (-31.4885383693, -8.2450567844))
            ThreePointArc((-31.4885383693, -8.2450567844), (-31.9246589557, -6.3502094907), (-32.2468627383, -4.4327027358))
            Line((-32.2468627383, -4.4327027358), (-32.5415226488, -4.5656185547))
            ThreePointArc((-32.5415226488, -4.5656185547), (-34.1510381023, -5.5942061718), (-35.3980380551, -7.0411075501))
            ThreePointArc((-35.3980380551, -7.0411075501), (-33.6922551359, -7.900663897), (-31.8116333114, -8.2350200457))
        make_face()
        with BuildLine():
            ThreePointArc((-30.0699408338, 3.0902142758), (-31.1168279297, 3.8288728943), (-32.2468627383, 4.4327027358))
            ThreePointArc((-32.2468627383, 4.4327027358), (-32.5501, 0), (-32.2468627383, -4.4327027358))
            ThreePointArc((-32.2468627383, -4.4327027358), (-31.1168279297, -3.8288728943), (-30.0699408338, -3.0902142758))
            ThreePointArc((-30.0699408338, -3.0902142758), (-28.5877, 0), (-30.0699408338, 3.0902142758))
        make_face()
    extrude(amount=-F3_DEPTH, mode=Mode.INTERSECT)


solid = f1.part
